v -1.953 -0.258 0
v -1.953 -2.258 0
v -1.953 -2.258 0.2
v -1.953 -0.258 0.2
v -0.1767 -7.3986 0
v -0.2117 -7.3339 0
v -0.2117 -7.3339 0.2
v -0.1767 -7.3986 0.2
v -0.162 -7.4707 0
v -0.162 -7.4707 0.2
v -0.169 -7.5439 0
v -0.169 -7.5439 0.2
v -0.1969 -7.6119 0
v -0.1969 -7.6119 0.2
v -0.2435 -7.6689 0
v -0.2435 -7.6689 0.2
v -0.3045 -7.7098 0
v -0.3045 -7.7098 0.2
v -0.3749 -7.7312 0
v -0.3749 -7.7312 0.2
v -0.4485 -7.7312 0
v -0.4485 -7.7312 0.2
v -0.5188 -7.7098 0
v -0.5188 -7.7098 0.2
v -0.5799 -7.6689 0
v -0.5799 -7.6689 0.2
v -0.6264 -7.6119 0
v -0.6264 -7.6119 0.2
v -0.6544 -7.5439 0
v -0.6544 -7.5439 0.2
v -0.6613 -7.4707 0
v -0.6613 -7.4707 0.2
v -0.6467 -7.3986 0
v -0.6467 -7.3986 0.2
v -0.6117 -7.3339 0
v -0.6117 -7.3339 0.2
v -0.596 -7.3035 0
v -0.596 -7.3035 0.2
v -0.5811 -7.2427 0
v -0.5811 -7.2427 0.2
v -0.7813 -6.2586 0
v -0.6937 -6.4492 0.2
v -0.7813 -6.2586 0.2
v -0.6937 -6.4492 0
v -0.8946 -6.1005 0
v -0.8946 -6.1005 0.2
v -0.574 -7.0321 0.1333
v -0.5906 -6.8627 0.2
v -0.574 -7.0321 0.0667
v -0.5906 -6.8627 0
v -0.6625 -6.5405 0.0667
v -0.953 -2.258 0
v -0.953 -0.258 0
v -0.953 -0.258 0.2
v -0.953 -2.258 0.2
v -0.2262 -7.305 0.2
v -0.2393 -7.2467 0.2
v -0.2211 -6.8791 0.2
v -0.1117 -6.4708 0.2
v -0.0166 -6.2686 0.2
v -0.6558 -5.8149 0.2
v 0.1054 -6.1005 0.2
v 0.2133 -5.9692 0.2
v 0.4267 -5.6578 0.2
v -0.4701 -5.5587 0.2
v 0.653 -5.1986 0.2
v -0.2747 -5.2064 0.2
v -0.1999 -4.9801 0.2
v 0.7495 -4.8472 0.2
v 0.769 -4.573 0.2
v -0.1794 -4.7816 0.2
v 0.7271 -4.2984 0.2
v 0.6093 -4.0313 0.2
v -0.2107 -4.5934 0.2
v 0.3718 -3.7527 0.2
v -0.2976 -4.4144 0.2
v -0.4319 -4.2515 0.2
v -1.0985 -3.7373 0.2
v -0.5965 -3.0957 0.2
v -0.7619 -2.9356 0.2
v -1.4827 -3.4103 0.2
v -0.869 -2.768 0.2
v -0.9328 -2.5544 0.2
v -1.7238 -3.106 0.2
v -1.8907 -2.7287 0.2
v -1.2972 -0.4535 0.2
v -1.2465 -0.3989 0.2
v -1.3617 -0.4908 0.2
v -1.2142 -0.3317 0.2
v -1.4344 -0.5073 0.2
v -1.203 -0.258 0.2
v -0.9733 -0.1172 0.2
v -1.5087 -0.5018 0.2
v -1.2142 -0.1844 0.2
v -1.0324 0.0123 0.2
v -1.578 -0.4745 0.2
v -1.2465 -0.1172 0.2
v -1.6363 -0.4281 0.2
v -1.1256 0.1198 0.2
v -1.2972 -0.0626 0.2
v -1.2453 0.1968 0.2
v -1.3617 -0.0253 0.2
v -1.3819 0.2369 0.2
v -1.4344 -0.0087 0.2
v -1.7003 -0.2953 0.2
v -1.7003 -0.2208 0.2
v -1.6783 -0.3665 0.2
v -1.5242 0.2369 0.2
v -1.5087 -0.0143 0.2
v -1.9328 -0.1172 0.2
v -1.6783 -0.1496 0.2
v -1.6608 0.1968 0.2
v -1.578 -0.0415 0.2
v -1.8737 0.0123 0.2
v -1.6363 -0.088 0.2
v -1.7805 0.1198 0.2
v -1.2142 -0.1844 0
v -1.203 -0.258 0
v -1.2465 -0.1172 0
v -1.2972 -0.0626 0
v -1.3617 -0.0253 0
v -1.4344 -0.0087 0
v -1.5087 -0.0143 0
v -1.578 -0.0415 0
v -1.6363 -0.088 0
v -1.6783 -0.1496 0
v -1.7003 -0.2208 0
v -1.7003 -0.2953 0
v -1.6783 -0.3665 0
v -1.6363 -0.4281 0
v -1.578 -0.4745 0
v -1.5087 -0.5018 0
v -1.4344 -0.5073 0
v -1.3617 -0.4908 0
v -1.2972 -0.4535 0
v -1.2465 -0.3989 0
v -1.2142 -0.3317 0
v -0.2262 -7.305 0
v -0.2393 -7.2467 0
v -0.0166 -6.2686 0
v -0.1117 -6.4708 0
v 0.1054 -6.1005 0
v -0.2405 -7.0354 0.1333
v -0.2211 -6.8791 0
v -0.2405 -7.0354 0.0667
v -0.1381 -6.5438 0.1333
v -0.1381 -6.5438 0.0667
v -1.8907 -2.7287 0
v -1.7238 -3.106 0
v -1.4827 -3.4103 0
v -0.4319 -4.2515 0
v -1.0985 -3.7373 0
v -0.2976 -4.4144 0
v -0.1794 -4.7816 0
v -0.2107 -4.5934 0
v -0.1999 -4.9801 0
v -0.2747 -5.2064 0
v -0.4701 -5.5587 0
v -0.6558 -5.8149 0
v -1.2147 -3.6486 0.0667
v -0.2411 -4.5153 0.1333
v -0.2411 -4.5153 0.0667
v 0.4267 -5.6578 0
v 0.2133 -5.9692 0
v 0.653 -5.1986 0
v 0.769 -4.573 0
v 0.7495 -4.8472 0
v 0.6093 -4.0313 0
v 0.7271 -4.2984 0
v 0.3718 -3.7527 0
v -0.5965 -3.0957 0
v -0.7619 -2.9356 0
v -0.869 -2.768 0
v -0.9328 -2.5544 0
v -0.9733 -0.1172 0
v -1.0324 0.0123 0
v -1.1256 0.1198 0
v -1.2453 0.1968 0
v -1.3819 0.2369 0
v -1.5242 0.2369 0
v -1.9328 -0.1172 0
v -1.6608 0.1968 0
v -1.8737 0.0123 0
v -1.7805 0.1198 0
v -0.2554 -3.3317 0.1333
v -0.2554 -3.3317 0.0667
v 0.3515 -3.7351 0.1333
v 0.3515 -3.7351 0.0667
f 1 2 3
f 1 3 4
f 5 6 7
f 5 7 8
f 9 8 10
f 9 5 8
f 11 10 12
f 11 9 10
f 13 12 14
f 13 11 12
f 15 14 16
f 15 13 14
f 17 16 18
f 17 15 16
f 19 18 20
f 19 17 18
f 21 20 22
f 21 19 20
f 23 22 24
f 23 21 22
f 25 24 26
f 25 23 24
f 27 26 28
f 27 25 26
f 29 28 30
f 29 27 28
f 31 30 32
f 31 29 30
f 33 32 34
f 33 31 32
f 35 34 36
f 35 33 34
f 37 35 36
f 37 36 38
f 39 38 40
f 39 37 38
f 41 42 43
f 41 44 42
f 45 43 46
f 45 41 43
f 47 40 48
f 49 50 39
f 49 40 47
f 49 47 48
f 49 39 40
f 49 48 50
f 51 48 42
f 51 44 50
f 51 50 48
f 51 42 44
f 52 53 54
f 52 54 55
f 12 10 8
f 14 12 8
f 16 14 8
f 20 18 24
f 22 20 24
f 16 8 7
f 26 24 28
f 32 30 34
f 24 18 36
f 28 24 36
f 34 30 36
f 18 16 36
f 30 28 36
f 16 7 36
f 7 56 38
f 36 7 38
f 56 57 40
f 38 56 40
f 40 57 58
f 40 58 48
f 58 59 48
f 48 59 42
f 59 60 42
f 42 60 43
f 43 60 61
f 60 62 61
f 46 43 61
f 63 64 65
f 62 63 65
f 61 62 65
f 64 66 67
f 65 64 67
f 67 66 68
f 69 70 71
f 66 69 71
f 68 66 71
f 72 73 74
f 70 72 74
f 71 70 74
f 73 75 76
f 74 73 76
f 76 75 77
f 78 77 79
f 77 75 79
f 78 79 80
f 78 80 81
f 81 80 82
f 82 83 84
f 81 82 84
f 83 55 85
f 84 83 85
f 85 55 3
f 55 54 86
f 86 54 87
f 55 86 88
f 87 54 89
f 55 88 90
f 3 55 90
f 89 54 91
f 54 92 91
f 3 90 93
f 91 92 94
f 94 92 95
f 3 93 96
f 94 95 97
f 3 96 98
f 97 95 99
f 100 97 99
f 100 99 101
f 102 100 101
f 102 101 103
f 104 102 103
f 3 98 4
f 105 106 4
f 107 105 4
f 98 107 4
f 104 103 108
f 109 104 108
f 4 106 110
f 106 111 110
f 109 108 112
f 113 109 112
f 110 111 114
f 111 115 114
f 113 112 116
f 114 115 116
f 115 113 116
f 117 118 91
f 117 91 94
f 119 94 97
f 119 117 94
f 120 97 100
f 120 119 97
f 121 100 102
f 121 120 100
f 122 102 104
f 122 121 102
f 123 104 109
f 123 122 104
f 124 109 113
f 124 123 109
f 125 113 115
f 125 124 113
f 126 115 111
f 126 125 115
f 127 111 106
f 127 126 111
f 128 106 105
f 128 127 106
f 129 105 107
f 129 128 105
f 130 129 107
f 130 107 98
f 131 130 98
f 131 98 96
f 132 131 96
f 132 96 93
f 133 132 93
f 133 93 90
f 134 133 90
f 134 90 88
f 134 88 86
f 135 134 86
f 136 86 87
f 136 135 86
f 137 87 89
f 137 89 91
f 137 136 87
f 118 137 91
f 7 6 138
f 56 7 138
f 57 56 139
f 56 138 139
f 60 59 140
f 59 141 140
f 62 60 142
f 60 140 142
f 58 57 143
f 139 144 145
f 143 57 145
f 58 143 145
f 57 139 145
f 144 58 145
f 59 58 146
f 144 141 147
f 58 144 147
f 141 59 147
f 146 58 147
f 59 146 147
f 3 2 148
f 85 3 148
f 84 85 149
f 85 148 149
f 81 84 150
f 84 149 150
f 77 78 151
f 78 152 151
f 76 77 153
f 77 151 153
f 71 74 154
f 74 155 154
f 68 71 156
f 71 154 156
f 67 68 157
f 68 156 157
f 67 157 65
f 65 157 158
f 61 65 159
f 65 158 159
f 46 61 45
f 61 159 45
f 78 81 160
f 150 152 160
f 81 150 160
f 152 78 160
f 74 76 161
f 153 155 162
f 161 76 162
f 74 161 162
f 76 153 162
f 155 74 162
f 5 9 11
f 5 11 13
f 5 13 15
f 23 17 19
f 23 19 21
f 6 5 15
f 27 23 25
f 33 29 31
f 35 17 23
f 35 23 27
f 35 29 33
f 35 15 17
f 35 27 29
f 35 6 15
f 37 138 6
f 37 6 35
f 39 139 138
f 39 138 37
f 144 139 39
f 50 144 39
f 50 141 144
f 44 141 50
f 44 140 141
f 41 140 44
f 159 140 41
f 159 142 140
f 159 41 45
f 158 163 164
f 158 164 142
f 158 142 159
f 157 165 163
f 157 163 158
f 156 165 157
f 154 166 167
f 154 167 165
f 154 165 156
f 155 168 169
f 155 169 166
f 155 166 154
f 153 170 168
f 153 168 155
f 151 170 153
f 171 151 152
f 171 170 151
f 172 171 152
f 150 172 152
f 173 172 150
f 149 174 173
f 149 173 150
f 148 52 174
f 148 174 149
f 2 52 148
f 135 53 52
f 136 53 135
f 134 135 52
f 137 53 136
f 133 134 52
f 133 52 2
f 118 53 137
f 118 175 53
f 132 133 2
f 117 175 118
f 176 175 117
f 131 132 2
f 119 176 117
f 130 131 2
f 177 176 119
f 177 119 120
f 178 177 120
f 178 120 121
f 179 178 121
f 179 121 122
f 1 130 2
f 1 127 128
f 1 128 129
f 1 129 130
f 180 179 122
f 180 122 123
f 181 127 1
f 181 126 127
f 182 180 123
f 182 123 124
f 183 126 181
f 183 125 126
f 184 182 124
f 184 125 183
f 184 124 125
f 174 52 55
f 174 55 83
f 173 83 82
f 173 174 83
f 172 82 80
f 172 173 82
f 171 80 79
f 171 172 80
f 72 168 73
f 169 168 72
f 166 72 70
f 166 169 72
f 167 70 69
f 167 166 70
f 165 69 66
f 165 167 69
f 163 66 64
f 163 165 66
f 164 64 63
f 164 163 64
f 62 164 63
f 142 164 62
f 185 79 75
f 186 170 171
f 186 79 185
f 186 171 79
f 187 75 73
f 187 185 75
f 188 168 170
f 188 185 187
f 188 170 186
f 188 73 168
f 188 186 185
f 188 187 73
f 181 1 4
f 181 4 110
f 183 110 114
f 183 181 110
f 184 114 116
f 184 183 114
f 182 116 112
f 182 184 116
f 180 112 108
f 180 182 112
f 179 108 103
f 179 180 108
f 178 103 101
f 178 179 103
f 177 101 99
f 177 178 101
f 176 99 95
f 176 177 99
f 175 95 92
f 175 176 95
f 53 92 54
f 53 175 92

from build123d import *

# Parameters (mm, degrees)
CROQUIS1_R              = 0.25
SALIENTE_EXTRUIR1_DEPTH = 0.2


with BuildPart() as part:
    # Croquis1 → Saliente-Extruir1 (new body)
    with BuildSketch(Plane.XY):
        with BuildLine():
            Line((-0.953049545, -0.258041218), (-0.953049545, -2.258041218))
            add(Edge.make_bspline(
                [(-0.953049545, -2.258041218), (-0.953049545, -2.777596153), (-0.792723594, -3.039794493), (1.611557074, -4.393344835), (0.148079669, -6.054927281), (0.105412555, -6.100480554)],
                knots=[0, 0, 0, 0, 0.302759369, 0.402759369, 1, 1, 1, 1], degree=3))
            add(Edge.make_bspline(
                [(-0.211679745, -7.333949248), (-0.302912235, -7.212305928), (-0.211828565, -6.439181016), (0.105412555, -6.100480554)],
                knots=[0, 0, 0, 0, 1, 1, 1, 1], degree=3))
            ThreePointArc((-0.211679745, -7.333949248), (-0.411679745, -7.733949248), (-0.611679745, -7.333949248))
            add(Edge.make_bspline(
                [(-0.611679745, -7.333949248), (-0.51667907, -7.207281682), (-0.584931115, -6.434344759), (-0.894587445, -6.100480554)],
                knots=[0, 0, 0, 0, 1, 1, 1, 1], degree=3))
            add(Edge.make_bspline(
                [(-1.953049545, -2.258041218), (-1.953049545, -4.324497965), (1.193109737, -3.742015961), (-0.894587445, -6.100480554)],
                knots=[0, 0, 0, 0, 1, 1, 1, 1], degree=3))
            Line((-1.953049545, -2.258041218), (-1.953049545, -0.258041218))
            ThreePointArc((-1.953049545, -0.258041218), (-1.453049545, 0.241958782), (-0.953049545, -0.258041218))
        make_face()
        with Locations((-1.453049545, -0.258041218)):
            Circle(CROQUIS1_R, mode=Mode.SUBTRACT)
    extrude(amount=SALIENTE_EXTRUIR1_DEPTH)


solid = part.part
